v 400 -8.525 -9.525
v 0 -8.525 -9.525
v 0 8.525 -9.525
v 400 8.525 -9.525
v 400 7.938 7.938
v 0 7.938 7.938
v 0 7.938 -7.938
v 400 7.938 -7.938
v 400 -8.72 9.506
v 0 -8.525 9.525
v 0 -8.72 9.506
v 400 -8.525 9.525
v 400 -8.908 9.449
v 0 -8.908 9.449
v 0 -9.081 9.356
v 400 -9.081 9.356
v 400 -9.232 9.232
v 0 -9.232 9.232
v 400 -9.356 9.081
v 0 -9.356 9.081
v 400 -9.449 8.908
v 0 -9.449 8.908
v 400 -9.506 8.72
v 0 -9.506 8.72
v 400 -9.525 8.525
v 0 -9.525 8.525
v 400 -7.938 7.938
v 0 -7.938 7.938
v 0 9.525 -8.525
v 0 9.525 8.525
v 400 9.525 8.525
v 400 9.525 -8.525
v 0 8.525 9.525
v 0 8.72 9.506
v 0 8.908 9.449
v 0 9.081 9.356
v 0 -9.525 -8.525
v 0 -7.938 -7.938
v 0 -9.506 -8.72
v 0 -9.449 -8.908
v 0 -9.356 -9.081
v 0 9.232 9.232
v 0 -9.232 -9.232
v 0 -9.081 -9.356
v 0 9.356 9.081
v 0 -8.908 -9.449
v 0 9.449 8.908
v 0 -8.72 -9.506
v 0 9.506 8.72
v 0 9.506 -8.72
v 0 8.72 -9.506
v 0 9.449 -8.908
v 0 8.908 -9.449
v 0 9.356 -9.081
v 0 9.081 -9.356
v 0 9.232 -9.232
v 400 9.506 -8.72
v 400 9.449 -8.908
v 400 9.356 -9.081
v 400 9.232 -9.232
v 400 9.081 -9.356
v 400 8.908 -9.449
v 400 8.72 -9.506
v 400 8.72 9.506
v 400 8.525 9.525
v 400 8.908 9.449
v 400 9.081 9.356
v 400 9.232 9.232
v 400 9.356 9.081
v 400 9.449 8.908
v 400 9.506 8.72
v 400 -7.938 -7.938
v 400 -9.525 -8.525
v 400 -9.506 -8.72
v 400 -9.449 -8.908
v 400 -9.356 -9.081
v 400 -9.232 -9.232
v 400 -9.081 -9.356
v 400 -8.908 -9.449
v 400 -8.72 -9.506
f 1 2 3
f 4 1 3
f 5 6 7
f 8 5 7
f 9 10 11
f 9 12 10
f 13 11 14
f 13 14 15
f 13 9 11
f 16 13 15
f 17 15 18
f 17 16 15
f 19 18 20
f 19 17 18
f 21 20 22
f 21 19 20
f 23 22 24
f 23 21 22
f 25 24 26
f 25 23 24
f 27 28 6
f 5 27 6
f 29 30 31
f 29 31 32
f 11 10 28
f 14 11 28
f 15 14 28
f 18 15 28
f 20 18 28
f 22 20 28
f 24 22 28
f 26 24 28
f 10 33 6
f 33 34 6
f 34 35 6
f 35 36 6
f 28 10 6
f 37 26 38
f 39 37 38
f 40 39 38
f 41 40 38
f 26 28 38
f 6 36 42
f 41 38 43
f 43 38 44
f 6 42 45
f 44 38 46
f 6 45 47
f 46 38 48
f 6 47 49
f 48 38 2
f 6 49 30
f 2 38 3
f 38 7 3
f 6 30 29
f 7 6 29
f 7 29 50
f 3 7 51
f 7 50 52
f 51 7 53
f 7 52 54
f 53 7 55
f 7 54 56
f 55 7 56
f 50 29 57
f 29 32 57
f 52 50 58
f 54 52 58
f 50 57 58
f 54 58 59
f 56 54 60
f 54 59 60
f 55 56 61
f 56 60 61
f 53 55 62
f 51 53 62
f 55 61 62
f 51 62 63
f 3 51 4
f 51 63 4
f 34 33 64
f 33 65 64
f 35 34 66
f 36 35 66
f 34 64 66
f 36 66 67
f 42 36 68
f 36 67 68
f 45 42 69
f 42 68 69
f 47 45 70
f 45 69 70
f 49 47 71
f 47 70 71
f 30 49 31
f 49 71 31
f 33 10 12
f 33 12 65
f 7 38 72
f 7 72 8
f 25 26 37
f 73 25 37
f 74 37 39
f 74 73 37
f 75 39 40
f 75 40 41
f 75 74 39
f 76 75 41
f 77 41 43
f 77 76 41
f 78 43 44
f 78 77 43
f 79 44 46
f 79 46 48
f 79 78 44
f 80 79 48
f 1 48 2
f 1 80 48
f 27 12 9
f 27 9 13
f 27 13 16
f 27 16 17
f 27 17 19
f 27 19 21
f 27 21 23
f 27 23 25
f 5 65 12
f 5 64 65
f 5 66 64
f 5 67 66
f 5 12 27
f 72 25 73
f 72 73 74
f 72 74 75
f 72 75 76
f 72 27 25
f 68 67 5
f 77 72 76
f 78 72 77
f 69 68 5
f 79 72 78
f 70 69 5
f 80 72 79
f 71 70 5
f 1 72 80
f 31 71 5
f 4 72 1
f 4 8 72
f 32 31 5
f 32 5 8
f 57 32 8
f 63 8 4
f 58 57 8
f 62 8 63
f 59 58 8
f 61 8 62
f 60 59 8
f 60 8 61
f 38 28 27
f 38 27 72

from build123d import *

# Parameters (mm, degrees)
SKETCH2_W           = 19.05
SKETCH2_H           = 19.05
SKETCH2_W_2         = 15.875
SKETCH2_H_2         = 15.875
BOSS_EXTRUDE1_DEPTH = 400
FILLET1_R           = 1


with BuildPart() as part:
    # Sketch2 → Boss-Extrude1 (new body)
    with BuildSketch(Plane(origin=(0, 0, 0), x_dir=(0, 0, -1), z_dir=(1, 0, 0))):
        Rectangle(SKETCH2_W, SKETCH2_H)
        Rectangle(SKETCH2_W_2, SKETCH2_H_2, mode=Mode.SUBTRACT)
    extrude(amount=BOSS_EXTRUDE1_DEPTH)

    # Fillet1
    fillet1_edges = [part.edges().sort_by_distance(p)[0] for p in [
        (200, -9.525, -9.525),
        (200, -9.525, 9.525),
        (200, 9.525, 9.525),
        (200, 9.525, -9.525),
    ]]
    fillet(fillet1_edges, radius=FILLET1_R)


solid = part.part
